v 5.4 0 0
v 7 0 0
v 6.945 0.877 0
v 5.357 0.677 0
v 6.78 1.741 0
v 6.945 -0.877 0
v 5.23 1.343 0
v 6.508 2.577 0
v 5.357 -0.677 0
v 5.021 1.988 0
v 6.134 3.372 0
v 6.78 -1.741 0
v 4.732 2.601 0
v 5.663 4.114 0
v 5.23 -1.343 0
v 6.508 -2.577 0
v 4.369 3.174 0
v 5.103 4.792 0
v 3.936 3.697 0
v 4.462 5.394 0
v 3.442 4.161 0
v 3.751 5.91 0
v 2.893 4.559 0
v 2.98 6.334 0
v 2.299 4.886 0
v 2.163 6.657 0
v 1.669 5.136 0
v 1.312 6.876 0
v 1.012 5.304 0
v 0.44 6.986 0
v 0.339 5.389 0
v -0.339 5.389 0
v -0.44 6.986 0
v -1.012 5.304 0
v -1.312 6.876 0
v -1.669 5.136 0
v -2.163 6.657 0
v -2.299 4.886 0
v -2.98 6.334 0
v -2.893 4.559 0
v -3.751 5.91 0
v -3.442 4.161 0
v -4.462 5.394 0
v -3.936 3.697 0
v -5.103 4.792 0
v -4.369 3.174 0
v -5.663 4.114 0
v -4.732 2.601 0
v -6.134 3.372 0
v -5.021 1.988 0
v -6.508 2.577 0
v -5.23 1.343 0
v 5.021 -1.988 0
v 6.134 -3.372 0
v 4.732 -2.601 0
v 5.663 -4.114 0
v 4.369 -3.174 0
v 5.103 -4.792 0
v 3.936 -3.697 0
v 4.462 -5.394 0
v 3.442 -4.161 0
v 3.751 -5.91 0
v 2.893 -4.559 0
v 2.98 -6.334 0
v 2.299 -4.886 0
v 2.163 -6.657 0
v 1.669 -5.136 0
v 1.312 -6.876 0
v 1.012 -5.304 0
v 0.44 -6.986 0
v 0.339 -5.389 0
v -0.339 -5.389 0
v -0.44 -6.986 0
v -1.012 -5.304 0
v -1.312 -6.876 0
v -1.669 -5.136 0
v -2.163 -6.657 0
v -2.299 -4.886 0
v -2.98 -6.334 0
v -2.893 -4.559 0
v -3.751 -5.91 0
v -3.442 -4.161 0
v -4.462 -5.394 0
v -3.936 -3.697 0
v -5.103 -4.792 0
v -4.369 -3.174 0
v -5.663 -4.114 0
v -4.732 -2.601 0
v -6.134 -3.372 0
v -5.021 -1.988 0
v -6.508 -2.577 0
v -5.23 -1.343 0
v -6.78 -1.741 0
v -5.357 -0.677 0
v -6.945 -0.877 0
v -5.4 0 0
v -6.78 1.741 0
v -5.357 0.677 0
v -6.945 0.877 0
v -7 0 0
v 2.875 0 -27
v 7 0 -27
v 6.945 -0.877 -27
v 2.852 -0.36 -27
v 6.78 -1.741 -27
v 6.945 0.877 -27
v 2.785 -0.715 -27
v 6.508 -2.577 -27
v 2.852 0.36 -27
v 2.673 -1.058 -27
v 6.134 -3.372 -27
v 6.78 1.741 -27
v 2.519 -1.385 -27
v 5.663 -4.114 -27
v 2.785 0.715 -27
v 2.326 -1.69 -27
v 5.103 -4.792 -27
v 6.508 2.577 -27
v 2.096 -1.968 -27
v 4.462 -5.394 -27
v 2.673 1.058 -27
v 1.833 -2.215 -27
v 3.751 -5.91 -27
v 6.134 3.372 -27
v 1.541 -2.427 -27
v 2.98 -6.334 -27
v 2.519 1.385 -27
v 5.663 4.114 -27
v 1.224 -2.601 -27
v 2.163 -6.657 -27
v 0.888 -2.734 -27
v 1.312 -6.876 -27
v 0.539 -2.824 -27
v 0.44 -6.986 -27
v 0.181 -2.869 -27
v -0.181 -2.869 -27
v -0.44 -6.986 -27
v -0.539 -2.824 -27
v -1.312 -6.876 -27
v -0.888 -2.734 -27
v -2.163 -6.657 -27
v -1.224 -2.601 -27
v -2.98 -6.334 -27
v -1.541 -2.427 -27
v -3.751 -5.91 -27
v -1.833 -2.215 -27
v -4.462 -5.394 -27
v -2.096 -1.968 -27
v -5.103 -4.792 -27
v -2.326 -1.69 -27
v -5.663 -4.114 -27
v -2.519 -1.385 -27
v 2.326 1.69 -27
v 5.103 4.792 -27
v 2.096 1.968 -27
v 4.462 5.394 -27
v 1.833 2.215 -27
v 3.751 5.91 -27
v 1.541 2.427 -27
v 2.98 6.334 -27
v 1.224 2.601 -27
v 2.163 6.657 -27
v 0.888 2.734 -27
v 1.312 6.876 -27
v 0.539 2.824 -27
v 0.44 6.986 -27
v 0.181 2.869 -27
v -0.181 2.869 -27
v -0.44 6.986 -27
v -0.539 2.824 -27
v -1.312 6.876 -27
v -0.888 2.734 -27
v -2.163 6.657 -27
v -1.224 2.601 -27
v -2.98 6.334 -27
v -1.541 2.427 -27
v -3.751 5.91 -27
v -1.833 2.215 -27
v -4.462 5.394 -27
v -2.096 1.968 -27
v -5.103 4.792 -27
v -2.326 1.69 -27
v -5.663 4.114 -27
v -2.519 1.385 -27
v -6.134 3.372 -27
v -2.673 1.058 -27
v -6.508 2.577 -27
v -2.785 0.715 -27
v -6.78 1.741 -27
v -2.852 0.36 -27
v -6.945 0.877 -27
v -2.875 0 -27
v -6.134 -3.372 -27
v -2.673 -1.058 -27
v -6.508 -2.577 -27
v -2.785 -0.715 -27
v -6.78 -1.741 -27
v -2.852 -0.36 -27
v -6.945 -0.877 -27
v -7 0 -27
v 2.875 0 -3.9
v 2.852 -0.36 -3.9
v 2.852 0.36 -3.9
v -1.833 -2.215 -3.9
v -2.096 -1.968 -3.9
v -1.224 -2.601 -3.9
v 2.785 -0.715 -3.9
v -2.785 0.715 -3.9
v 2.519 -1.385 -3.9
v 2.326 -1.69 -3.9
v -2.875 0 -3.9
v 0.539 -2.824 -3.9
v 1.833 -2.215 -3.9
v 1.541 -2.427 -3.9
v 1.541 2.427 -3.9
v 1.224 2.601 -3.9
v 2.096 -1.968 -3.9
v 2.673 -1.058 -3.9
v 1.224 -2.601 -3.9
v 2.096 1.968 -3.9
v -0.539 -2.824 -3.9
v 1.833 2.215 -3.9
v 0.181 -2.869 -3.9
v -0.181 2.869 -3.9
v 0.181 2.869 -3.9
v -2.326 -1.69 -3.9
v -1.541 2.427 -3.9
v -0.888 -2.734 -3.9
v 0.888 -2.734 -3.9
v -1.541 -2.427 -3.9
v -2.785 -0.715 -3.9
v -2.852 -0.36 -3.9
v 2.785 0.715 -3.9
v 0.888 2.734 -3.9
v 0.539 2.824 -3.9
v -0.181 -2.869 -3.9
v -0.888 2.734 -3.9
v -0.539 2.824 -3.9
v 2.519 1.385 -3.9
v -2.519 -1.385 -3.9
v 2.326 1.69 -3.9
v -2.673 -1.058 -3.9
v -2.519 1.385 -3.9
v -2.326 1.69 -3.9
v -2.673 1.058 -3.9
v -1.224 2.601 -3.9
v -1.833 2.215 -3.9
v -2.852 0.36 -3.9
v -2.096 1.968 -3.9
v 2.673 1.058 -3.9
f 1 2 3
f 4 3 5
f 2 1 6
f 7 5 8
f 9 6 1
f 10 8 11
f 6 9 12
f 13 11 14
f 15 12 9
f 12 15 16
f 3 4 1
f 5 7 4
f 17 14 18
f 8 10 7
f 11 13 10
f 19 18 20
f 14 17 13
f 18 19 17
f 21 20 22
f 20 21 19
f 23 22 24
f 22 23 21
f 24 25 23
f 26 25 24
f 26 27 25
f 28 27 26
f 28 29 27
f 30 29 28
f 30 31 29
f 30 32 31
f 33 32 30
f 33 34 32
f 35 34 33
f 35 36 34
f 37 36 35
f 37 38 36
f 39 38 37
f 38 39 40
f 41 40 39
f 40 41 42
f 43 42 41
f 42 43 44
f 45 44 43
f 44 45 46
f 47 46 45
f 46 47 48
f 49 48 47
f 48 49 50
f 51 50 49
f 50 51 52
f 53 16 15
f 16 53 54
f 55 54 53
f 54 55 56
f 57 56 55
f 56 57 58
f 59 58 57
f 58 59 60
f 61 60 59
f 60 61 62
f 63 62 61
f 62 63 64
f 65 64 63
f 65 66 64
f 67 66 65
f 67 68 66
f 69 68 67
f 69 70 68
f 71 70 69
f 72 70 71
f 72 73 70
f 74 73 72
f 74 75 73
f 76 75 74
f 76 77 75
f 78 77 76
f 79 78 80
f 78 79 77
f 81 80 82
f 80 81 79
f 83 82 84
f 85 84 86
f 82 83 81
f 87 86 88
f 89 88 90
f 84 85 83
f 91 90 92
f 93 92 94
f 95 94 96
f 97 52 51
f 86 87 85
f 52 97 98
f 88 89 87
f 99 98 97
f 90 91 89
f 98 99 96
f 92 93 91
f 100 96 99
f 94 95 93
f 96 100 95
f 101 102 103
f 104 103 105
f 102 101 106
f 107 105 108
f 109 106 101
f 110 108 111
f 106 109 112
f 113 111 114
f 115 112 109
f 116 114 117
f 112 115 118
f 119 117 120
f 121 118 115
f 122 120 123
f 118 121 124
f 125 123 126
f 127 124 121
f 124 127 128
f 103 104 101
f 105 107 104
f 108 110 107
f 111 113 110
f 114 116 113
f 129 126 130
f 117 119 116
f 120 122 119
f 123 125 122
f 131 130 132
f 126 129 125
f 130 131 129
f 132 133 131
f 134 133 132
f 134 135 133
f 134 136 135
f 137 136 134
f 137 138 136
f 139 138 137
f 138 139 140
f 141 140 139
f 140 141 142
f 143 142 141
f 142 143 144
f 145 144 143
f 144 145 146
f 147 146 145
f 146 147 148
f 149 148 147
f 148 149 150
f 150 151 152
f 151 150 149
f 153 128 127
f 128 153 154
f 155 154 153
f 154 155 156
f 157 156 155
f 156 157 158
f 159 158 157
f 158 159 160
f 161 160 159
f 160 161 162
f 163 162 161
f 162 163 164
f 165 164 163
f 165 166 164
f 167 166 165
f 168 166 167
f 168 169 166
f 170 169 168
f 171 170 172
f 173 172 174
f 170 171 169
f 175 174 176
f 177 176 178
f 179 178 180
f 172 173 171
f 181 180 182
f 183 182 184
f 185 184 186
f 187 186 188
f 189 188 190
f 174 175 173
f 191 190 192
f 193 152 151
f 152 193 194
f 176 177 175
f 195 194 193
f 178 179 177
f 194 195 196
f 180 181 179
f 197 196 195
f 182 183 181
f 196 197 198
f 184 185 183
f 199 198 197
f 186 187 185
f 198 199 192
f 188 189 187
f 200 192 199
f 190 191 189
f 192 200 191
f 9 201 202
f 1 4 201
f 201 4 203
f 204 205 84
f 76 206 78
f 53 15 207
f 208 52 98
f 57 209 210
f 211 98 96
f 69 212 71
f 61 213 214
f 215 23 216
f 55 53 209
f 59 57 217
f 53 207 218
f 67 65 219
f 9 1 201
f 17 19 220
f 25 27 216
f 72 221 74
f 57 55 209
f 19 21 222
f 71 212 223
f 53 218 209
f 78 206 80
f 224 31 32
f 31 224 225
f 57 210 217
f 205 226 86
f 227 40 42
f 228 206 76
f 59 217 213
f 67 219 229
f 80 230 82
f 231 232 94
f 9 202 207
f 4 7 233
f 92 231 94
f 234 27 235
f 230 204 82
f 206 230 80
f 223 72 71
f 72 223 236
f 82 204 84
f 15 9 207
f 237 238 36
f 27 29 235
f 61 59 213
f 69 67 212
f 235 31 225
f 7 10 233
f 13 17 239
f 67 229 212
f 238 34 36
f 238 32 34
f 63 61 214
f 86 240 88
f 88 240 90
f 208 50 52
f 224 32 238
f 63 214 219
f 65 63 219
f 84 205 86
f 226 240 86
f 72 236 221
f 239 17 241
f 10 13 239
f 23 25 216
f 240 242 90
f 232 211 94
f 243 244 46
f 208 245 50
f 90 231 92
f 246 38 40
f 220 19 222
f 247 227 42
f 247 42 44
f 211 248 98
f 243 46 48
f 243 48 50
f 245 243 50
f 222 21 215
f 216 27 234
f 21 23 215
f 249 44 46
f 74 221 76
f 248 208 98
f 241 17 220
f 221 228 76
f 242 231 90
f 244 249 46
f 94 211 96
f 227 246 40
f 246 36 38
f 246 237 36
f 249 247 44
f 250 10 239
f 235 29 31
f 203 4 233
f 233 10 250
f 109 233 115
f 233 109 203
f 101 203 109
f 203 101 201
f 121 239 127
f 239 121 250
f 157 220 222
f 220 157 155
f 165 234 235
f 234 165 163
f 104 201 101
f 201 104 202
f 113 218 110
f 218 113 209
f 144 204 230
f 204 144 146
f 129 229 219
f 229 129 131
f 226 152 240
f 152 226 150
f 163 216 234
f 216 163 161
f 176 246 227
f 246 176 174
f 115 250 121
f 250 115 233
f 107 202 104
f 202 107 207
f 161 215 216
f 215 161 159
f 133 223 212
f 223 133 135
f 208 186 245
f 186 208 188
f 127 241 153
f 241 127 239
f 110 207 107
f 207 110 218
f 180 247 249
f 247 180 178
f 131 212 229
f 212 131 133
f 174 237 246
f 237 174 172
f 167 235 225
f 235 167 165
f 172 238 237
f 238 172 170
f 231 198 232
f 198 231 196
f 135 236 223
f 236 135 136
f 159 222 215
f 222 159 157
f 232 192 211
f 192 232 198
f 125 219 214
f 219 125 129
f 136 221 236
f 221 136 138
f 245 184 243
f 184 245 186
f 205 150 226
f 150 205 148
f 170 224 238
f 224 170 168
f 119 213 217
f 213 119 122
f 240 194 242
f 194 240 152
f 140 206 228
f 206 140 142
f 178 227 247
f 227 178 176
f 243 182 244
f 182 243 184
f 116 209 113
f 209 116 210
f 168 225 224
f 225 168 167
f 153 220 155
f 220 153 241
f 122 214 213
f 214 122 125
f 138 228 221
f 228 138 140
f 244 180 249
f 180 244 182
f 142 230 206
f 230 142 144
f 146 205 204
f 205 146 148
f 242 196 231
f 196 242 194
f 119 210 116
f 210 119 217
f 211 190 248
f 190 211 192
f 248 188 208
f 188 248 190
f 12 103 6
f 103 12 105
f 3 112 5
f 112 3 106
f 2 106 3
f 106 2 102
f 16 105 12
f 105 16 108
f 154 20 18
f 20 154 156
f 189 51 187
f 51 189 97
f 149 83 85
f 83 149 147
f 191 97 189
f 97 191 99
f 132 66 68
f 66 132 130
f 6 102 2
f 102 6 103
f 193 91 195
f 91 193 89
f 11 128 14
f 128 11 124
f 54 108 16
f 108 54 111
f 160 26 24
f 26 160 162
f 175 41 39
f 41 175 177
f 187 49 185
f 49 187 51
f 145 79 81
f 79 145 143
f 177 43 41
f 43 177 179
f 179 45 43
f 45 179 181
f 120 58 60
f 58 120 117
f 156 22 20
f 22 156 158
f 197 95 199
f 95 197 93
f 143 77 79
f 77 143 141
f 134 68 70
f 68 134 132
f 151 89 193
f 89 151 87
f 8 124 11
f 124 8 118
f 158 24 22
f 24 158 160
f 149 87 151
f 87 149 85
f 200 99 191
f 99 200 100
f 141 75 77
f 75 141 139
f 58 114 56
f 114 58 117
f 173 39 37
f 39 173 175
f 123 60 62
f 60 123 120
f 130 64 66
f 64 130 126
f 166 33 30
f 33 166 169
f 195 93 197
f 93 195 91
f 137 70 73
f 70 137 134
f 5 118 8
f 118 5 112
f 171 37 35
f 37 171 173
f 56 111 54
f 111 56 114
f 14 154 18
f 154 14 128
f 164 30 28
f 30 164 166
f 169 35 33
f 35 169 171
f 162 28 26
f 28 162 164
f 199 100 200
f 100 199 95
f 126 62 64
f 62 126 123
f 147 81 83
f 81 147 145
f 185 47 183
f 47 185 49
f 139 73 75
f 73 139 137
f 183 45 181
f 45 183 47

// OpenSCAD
$fn = 50;


difference() {
	union() {
		translate(v = [0, 0, -27.0000000000]) {
			cylinder(h = 27, r = 7.0000000000);
		}
		cylinder(h = 0, r = 17.0000000000);
	}
	union() {
		translate(v = [0, 0, 0]) {
			rotate(a = [0, 0, 0]) {
				difference() {
					union() {
						#translate(v = [0, 0, -27.0000000000]) {
							cylinder(h = 27, r = 2.6000000000);
						}
						#translate(v = [0, 0, -3.9000000000]) {
							cylinder(h = 3.9000000000, r1 = 2.8750000000, r2 = 5.4000000000);
						}
						#translate(v = [0, 0, -27.0000000000]) {
							cylinder(h = 27, r = 2.8750000000);
						}
						#translate(v = [0, 0, -27.0000000000]) {
							cylinder(h = 27, r = 2.6000000000);
						}
					}
					union();
				}
			}
		}
	}
}
